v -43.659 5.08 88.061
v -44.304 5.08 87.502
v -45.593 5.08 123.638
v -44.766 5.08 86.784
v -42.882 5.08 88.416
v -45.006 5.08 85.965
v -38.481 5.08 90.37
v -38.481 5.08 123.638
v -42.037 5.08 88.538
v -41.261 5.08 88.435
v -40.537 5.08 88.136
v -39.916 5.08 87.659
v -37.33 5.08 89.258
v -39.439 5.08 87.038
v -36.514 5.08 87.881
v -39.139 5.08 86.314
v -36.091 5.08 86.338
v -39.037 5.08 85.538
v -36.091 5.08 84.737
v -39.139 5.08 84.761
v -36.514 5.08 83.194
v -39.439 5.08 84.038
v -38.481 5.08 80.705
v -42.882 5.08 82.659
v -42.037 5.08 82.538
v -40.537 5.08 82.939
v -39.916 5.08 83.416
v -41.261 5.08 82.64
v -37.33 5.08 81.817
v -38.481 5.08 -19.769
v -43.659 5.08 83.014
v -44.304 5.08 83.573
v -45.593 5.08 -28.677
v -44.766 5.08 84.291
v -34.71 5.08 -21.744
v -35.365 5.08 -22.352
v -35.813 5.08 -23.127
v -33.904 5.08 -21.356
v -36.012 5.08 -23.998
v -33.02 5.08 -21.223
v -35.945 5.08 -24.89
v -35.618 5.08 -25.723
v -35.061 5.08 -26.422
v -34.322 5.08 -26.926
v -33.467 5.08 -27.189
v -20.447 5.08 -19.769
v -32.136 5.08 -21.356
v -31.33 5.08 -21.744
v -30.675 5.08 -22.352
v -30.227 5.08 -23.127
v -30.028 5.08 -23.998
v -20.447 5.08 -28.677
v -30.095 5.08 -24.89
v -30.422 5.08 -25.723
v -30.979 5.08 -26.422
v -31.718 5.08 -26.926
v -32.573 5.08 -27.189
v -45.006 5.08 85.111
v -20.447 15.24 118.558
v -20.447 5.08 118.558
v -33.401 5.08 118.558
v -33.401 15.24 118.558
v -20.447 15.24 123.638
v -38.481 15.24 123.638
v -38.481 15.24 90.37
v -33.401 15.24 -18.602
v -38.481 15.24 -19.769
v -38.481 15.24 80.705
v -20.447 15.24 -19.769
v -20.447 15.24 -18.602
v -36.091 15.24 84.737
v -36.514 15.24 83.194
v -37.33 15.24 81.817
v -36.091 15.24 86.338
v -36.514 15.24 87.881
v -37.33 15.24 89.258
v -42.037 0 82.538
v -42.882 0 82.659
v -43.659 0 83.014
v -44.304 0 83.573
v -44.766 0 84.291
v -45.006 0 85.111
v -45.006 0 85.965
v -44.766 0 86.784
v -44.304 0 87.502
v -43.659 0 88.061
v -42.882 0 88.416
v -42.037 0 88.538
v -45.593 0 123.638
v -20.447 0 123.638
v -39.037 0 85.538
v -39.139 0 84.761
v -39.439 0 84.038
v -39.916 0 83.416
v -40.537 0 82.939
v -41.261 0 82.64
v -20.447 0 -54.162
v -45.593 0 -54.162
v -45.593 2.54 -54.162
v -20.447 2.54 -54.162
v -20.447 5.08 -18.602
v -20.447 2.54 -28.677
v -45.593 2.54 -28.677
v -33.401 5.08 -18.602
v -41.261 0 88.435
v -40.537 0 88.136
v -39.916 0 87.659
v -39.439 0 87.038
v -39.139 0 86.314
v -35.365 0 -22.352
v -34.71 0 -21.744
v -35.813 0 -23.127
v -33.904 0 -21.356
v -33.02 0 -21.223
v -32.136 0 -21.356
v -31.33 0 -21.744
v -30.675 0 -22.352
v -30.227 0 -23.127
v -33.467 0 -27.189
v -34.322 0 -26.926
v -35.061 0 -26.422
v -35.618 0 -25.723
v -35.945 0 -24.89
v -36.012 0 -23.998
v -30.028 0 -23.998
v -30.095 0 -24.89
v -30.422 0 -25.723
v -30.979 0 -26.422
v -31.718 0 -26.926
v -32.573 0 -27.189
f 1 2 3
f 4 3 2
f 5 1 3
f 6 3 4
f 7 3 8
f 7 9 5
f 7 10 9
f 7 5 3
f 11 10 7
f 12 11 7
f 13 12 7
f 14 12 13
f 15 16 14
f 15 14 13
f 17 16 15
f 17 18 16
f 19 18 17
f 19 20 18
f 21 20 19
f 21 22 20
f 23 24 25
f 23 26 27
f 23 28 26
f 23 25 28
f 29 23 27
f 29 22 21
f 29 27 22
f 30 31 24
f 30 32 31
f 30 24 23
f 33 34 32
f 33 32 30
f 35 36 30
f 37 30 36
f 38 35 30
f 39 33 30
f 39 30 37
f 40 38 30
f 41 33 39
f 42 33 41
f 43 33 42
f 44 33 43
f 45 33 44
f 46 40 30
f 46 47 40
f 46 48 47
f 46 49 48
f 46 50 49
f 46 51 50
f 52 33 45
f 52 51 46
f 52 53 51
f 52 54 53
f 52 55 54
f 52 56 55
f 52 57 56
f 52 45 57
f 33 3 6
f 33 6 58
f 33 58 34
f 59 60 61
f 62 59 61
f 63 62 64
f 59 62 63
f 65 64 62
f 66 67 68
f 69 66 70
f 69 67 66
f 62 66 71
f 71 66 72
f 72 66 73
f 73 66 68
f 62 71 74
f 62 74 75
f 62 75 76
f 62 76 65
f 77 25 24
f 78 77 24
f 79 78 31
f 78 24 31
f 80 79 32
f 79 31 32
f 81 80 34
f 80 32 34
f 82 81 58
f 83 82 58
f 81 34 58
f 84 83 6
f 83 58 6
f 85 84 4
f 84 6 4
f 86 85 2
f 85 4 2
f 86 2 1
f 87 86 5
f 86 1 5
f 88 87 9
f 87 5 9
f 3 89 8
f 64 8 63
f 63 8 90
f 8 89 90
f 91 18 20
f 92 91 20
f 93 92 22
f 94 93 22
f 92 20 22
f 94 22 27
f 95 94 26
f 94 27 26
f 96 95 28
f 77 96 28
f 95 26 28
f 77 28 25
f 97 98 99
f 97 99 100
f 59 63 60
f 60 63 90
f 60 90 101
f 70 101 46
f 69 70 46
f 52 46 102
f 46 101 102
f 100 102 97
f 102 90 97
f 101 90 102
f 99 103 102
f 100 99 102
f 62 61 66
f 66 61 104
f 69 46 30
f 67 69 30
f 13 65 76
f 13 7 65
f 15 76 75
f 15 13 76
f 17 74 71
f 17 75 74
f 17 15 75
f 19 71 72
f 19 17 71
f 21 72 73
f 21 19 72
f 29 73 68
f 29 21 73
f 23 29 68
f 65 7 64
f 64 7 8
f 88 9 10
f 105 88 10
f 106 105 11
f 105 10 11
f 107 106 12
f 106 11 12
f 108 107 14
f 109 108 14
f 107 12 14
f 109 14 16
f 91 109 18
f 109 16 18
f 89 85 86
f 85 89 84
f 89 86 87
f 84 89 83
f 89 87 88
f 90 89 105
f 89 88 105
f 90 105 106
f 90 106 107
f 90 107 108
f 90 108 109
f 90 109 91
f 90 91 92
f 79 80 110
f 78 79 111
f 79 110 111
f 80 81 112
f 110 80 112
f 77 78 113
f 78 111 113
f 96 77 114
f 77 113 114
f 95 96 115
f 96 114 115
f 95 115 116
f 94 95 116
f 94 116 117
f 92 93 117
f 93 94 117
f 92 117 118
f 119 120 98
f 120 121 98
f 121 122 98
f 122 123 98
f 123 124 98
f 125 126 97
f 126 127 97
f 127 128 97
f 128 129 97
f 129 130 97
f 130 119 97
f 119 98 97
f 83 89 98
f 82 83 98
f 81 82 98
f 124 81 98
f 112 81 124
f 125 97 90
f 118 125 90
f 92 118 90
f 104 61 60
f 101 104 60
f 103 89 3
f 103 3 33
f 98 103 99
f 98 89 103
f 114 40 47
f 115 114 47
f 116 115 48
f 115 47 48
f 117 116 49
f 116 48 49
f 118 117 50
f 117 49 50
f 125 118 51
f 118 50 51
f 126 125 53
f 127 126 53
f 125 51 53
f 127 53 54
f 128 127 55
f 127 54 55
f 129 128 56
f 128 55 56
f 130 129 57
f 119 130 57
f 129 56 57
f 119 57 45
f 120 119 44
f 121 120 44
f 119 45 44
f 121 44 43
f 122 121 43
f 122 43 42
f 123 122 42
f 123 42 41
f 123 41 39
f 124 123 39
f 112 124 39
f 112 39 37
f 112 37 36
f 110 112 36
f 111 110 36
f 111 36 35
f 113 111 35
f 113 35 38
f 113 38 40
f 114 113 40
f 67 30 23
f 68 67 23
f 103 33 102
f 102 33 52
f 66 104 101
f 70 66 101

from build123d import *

# Parameters (mm, degrees)
SKETCH1_W           = 25.146
SKETCH1_H           = 177.8
BOSS_EXTRUDE1_DEPTH = 5.08
BOSS_EXTRUDE3_DEPTH = 10.16
SKETCH4_W           = 25.146
SKETCH4_H           = 25.485835905
CUT_EXTRUDE1_DEPTH  = 2.54
SKETCH5_R           = 3
CUT_EXTRUDE2_DEPTH  = 133.167293803
SKETCH6_R           = 6
SKETCH6_R_2         = 3
CUT_EXTRUDE3_DEPTH  = 16.51
CUT_EXTRUDE4_DEPTH  = 133.167293803


with BuildPart() as part:
    # Sketch1 → Boss-Extrude1 (new body)
    with BuildSketch(Plane(origin=(0, 0, 0), x_dir=(1, 0, 0), z_dir=(0, 1, 0))):
        with Locations((-33.02, -34.737560241)):
            Rectangle(SKETCH1_W, SKETCH1_H)
    extrude(amount=BOSS_EXTRUDE1_DEPTH)

    # Sketch3 → Boss-Extrude3 (add)
    with BuildSketch(Plane(origin=(0, 5.08, 0), x_dir=(1, 0, 0), z_dir=(0, 1, 0))):
        Polygon((-38.481, -123.637560241), (-20.447, -123.637560241), (-20.447, -118.557560241), (-33.401, -118.557560241), (-33.401, 18.602439759), (-20.447, 18.602439759), (-20.447, 19.76859762), (-38.481, 19.76859762), align=None)
    extrude(amount=BOSS_EXTRUDE3_DEPTH)

    # Sketch4 → Cut-Extrude1 (cut)
    with BuildSketch(Plane(origin=(0, 5.08, 0), x_dir=(1, 0, 0), z_dir=(0, 1, 0))):
        with Locations((-33.02, 41.419521807)):
            Rectangle(SKETCH4_W, SKETCH4_H)
    extrude(amount=-CUT_EXTRUDE1_DEPTH, mode=Mode.SUBTRACT)

    # Sketch5 → Cut-Extrude2 (cut, through all)
    with BuildSketch(Plane(origin=(0, 5.08, 0), x_dir=(1, 0, 0), z_dir=(0, 1, 0))):
        with Locations(Location((-33.02, 24.222600737, 0), (0, 0, 270))):
            Circle(SKETCH5_R)
    extrude(amount=-CUT_EXTRUDE2_DEPTH, mode=Mode.SUBTRACT)

    # Sketch6 → Cut-Extrude3 (cut)
    with BuildSketch(Plane(origin=(0, 5.08, 0), x_dir=(1, 0, 0), z_dir=(0, 1, 0))):
        with Locations((-42.037, -85.537560241)):
            Circle(SKETCH6_R)
        with Locations((-42.037, -85.537560241)):
            Circle(SKETCH6_R_2, mode=Mode.SUBTRACT)
    extrude(amount=CUT_EXTRUDE3_DEPTH, mode=Mode.SUBTRACT)

    # Sketch6<3> → Cut-Extrude4 (cut, through all)
    with BuildSketch(Plane(origin=(0, 5.08, 0), x_dir=(1, 0, 0), z_dir=(0, 1, 0))):
        with BuildLine():
            ThreePointArc((-42.037, -82.537560241), (-45.037, -85.537560241), (-42.037, -88.537560241))
            Line((-42.037, -88.537560241), (-42.037, -82.537560241))
        make_face()
        with BuildLine():
            Line((-42.037, -82.537560241), (-42.037, -88.537560241))
            ThreePointArc((-42.037, -88.537560241), (-39.915679656, -87.658880585), (-39.037, -85.537560241))
            ThreePointArc((-39.037, -85.537560241), (-39.915679656, -83.416239897), (-42.037, -82.537560241))
        make_face()
    extrude(amount=-CUT_EXTRUDE4_DEPTH, mode=Mode.SUBTRACT)


solid = part.part
